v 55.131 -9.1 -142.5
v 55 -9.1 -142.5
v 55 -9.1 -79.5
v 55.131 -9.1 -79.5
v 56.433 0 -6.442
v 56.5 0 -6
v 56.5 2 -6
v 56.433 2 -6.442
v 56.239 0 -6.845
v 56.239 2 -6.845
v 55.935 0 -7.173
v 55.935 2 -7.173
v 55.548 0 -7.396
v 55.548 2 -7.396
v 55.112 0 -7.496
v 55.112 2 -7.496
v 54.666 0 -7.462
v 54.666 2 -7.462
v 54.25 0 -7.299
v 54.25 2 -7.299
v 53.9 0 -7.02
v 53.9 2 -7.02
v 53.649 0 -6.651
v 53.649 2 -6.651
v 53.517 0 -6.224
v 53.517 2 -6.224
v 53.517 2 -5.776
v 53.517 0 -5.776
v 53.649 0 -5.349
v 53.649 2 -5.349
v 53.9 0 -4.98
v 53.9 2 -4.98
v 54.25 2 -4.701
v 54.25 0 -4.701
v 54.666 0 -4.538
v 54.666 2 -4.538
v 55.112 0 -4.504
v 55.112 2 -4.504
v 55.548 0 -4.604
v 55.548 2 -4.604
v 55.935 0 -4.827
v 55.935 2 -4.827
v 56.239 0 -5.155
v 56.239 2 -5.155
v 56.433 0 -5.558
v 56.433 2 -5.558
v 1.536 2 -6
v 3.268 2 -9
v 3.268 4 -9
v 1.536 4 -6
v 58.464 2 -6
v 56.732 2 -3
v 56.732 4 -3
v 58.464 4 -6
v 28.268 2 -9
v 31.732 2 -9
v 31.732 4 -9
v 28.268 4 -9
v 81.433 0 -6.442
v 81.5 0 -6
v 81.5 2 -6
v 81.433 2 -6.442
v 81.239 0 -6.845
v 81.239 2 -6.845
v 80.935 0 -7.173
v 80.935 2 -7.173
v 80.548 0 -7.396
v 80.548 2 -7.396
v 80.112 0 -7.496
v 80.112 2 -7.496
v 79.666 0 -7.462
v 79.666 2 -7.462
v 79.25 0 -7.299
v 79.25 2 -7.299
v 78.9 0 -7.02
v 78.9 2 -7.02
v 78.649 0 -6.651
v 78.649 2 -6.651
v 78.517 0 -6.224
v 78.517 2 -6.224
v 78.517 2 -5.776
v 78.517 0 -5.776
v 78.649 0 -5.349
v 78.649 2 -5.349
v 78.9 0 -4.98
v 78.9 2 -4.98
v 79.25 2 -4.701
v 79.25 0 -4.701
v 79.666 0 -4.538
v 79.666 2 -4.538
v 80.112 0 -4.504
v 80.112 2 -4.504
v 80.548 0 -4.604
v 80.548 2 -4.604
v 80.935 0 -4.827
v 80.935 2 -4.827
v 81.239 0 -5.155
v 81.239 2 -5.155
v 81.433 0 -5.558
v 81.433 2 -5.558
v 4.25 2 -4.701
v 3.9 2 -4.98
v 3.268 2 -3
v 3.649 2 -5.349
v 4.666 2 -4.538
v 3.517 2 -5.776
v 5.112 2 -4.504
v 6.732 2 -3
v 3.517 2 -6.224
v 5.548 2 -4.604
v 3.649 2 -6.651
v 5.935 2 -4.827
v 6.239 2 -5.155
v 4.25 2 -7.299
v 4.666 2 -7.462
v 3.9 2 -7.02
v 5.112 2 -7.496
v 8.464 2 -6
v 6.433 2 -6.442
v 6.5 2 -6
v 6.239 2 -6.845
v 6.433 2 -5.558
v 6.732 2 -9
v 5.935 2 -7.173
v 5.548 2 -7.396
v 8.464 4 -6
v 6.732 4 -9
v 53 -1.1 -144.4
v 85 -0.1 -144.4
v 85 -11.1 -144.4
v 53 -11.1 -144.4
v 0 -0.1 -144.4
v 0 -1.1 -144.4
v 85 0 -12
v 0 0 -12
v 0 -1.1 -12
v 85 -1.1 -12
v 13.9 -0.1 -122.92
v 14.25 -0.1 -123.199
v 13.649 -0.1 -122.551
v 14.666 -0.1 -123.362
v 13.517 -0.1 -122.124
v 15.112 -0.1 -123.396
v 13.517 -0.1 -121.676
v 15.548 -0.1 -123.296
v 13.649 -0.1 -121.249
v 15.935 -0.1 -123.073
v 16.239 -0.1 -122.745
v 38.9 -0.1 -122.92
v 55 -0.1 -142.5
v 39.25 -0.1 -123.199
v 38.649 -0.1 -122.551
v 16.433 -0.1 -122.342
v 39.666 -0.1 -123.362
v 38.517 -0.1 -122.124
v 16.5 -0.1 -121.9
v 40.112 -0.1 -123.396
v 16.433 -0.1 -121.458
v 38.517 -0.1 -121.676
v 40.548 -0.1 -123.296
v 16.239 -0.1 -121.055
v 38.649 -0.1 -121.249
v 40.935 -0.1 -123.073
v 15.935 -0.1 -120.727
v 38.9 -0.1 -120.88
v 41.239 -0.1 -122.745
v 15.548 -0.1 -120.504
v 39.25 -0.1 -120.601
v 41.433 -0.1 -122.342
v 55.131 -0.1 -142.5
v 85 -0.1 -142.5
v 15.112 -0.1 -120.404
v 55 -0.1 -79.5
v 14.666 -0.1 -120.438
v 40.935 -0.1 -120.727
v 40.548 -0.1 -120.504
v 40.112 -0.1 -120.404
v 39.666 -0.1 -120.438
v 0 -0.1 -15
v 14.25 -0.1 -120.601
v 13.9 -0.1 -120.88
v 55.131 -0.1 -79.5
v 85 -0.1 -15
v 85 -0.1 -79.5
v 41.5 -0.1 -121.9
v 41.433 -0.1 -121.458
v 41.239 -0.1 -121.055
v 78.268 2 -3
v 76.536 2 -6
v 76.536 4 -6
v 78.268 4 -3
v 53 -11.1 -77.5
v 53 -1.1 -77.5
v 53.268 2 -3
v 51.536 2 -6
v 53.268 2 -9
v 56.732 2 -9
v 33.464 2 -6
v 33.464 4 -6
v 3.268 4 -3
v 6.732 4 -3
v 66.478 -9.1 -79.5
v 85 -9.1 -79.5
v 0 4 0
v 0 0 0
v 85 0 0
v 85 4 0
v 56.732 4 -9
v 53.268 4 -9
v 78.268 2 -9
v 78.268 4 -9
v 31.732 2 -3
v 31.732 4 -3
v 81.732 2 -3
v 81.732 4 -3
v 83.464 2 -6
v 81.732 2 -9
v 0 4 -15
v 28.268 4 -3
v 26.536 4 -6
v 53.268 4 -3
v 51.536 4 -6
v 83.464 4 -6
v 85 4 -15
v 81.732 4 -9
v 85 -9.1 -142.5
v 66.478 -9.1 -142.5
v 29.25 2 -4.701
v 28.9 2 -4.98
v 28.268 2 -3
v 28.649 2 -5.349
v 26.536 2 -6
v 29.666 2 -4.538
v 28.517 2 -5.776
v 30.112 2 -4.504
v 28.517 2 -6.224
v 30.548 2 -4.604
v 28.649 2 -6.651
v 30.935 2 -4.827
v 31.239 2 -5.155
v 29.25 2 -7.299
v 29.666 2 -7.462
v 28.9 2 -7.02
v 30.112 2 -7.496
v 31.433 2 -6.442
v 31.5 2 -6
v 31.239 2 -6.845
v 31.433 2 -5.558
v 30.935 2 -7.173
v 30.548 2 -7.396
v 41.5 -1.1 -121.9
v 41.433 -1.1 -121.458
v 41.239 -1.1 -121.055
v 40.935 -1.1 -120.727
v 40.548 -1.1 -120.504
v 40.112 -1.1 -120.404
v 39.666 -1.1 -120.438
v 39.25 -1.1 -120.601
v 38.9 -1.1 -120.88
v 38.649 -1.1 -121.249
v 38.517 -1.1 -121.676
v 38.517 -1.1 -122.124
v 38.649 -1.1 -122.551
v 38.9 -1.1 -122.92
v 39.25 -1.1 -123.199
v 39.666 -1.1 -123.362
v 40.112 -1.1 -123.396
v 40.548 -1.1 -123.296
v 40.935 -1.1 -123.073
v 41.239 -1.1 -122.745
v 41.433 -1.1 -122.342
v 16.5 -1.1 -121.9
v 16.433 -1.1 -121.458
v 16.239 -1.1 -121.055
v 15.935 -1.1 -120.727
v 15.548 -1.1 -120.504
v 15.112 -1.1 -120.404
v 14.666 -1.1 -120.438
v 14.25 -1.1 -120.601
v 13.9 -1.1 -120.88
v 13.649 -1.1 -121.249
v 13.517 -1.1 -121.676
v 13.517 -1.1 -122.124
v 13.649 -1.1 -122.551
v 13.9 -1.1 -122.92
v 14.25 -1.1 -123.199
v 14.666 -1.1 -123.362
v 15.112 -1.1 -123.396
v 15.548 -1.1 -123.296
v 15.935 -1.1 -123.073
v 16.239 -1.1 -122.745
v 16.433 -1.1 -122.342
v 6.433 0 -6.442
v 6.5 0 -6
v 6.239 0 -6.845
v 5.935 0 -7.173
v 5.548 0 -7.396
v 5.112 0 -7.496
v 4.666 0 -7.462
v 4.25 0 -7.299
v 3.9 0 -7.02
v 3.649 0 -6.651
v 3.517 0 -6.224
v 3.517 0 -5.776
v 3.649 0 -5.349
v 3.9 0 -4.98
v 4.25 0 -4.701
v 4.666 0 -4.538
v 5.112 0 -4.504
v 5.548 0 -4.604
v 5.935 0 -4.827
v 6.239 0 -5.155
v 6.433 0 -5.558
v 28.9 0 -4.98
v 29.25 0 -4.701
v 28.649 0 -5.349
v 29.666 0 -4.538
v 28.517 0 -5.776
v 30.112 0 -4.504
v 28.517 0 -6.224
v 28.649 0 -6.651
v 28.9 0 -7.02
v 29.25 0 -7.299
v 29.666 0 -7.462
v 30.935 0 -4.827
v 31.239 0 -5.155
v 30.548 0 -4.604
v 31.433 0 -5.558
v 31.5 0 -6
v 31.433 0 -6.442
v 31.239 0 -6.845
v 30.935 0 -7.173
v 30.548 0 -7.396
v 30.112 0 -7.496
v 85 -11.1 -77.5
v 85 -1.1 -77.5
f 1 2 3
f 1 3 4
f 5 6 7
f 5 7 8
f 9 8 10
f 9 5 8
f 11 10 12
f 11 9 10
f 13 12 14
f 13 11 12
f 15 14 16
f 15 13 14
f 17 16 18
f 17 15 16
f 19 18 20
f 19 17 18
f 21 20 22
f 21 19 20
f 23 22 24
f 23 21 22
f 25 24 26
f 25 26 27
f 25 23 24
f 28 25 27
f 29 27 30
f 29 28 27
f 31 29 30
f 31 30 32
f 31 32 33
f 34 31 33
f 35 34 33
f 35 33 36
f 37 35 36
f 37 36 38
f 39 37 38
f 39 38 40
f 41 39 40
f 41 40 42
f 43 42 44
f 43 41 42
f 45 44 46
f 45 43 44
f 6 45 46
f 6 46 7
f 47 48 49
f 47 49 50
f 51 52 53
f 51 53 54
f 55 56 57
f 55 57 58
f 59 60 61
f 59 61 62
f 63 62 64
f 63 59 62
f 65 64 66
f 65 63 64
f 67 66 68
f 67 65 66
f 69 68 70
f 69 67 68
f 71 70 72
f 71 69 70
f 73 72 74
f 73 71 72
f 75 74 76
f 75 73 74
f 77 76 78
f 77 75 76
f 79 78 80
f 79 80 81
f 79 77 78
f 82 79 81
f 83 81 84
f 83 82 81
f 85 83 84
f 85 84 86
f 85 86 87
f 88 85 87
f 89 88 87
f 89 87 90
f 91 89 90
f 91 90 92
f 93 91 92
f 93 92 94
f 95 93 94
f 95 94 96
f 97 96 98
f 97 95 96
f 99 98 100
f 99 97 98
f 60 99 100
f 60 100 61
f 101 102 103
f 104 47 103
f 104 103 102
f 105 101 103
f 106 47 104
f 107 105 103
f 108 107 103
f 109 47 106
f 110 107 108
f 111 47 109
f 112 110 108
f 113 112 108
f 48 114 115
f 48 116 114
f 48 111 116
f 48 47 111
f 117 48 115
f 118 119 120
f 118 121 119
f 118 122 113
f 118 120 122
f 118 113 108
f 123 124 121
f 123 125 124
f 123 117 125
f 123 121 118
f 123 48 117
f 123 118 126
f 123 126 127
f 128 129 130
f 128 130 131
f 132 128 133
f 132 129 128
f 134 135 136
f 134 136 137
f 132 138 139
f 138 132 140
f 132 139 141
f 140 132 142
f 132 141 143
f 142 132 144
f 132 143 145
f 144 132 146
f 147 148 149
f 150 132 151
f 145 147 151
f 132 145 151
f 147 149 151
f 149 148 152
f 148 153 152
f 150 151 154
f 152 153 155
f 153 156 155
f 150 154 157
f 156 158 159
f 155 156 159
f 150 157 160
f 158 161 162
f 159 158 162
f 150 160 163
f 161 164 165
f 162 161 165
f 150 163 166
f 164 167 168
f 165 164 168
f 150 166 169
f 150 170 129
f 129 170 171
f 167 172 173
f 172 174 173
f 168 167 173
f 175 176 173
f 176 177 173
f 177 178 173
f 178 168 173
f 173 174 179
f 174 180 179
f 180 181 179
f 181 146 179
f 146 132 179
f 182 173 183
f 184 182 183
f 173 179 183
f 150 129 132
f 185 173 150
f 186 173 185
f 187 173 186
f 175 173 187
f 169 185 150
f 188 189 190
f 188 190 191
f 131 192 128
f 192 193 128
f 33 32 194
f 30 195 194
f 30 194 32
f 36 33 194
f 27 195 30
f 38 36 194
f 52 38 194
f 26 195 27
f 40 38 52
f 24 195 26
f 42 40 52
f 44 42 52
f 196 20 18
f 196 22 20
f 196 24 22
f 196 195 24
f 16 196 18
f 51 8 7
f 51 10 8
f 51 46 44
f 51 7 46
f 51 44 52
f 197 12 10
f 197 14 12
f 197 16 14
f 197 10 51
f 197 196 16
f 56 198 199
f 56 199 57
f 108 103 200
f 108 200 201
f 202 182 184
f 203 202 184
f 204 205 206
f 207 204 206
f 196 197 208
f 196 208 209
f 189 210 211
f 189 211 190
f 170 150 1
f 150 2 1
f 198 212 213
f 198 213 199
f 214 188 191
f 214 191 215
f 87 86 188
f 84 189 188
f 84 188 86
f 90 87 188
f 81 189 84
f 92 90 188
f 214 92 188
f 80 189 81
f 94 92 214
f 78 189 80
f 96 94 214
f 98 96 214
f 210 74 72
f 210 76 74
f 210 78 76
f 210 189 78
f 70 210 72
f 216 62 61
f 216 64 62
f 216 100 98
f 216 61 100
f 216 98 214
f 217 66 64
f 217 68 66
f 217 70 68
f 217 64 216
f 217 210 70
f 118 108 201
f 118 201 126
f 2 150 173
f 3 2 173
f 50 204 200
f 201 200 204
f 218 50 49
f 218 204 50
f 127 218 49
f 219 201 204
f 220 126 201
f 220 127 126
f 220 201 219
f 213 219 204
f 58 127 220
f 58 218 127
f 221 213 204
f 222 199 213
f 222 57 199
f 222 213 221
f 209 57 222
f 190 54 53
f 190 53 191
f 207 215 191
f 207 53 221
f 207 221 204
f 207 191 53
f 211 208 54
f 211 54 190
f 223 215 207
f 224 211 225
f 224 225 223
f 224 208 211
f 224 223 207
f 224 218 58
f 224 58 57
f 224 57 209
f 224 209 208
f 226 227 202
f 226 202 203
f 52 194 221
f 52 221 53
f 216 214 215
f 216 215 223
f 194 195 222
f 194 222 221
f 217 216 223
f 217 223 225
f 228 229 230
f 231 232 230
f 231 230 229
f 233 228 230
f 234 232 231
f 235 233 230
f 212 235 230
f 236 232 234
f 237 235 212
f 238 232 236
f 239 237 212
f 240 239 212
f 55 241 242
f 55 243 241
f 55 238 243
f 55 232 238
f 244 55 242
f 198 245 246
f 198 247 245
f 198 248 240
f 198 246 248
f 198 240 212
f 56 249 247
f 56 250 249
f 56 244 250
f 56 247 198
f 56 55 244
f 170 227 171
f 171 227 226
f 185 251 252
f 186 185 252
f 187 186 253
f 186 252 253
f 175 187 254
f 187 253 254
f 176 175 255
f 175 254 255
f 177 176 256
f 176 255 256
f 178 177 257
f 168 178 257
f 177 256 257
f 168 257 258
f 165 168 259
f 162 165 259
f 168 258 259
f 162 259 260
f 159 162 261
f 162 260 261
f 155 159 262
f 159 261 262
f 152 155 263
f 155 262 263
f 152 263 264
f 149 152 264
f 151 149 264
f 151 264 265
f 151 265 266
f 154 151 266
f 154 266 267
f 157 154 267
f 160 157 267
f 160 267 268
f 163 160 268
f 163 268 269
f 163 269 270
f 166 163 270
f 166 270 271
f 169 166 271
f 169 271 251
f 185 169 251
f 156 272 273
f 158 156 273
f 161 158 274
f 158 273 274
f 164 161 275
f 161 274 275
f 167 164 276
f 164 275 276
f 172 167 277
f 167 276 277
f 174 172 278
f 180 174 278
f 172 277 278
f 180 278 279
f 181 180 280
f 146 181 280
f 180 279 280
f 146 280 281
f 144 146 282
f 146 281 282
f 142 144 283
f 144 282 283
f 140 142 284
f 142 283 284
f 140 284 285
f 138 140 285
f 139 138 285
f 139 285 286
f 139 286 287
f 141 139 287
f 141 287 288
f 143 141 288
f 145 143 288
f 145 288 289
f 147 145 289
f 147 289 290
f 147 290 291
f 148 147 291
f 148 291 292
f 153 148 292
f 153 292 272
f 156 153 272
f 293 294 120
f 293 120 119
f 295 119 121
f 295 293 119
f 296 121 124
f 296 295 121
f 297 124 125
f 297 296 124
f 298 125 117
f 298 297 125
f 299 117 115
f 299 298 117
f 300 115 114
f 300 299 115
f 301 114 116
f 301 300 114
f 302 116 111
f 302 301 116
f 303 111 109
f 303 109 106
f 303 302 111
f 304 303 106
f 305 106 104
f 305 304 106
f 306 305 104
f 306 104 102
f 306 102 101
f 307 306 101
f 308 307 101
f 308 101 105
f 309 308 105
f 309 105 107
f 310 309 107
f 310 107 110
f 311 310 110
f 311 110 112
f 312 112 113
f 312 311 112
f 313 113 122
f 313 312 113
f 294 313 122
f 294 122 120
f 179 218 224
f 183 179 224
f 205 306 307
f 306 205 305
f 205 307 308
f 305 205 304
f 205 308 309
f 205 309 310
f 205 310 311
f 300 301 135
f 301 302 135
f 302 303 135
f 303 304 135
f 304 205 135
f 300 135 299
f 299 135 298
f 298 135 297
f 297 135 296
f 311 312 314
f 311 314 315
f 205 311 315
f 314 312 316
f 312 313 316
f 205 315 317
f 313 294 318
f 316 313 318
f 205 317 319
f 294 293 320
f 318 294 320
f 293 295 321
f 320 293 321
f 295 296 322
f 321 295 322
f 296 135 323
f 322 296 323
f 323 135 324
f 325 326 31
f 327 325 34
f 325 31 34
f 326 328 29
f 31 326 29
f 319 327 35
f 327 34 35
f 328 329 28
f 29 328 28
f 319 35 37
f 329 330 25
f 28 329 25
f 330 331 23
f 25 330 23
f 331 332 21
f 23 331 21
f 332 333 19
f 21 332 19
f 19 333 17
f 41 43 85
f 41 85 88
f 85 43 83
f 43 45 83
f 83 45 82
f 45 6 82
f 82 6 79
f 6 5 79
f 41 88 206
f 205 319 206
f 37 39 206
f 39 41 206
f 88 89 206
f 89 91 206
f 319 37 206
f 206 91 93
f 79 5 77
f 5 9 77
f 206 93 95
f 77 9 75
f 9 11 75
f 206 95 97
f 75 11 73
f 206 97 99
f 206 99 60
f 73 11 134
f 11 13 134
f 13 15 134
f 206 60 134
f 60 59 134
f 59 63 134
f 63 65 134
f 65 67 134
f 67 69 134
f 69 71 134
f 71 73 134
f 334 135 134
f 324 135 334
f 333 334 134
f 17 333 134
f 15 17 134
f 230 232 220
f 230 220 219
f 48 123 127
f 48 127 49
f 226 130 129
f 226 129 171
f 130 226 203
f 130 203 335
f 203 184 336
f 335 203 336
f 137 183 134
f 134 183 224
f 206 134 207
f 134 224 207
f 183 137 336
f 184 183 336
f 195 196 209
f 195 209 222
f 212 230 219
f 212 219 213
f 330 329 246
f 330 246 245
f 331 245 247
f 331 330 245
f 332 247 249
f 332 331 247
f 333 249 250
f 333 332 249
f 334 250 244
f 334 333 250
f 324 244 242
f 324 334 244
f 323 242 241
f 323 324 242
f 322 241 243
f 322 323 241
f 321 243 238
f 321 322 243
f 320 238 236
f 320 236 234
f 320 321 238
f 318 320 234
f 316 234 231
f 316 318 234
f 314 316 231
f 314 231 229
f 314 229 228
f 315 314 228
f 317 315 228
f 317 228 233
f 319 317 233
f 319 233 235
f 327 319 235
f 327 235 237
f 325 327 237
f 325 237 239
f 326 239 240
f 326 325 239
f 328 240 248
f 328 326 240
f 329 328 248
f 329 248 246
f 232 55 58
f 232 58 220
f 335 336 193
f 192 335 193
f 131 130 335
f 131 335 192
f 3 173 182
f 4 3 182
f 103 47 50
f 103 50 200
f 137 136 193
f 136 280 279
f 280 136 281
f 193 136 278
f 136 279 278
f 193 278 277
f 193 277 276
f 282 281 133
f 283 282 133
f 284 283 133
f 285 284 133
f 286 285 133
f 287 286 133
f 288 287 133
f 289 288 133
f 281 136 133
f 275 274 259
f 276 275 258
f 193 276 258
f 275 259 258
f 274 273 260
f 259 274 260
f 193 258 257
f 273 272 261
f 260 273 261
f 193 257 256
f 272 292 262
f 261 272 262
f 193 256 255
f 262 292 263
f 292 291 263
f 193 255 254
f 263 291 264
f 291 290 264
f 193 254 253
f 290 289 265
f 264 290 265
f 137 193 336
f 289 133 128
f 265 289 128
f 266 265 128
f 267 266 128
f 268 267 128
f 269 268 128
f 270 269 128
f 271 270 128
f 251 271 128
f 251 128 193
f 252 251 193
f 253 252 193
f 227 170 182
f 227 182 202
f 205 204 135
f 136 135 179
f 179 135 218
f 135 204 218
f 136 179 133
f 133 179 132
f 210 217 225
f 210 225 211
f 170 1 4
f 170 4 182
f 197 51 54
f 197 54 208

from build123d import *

# Parameters (mm, degrees)
SKETCH1_W           = 85
SKETCH1_H           = 12
SKETCH1_R           = 1.5
BOSS_EXTRUDE1_DEPTH = 2
SKETCH1_3_W         = 85
SKETCH1_3_H         = 12
BOSS_EXTRUDE2_DEPTH = 4
SKETCH2_W           = 85
SKETCH2_H           = 3
BOSS_EXTRUDE3_DEPTH = 5.1
BOSS_EXTRUDE4_DEPTH = 1
BOSS_EXTRUDE5_DEPTH = 10
SKETCH5_W           = 32
SKETCH5_H           = 67
BOSS_EXTRUDE6_DEPTH = 2
SKETCH6_W           = 32
SKETCH6_H           = 2
BOSS_EXTRUDE7_DEPTH = 11
BOSS_EXTRUDE9_DEPTH = 65
SKETCH9_W           = 100.016978449
SKETCH9_H           = 38.136204689
CUT_EXTRUDE1_DEPTH  = 0.1
SKETCH10_R          = 1.5
CUT_EXTRUDE2_DEPTH  = 6.1


with BuildPart() as part:
    # Sketch1 → Boss-Extrude1 (new body)
    with BuildSketch(Plane(origin=(0, 0, 0), x_dir=(1, 0, 0), z_dir=(0, 1, 0))):
        with Locations((42.5, 6)):
            Rectangle(SKETCH1_W, SKETCH1_H)
        Polygon((81.732050808, 3), (83.464101615, 6), (81.732050808, 9), (78.267949192, 9), (76.535898385, 6), (78.267949192, 3), align=None, mode=Mode.SUBTRACT)
        Polygon((56.732050808, 3), (58.464101615, 6), (56.732050808, 9), (53.267949192, 9), (51.535898385, 6), (53.267949192, 3), align=None, mode=Mode.SUBTRACT)
        Polygon((31.732050808, 3), (33.464101615, 6), (31.732050808, 9), (28.267949192, 9), (26.535898385, 6), (28.267949192, 3), align=None, mode=Mode.SUBTRACT)
        Polygon((6.732050808, 3), (8.464101615, 6), (6.732050808, 9), (3.267949192, 9), (1.535898385, 6), (3.267949192, 3), align=None, mode=Mode.SUBTRACT)
        Polygon((3.267949192, 3), (6.732050808, 3), (8.464101615, 6), (6.732050808, 9), (3.267949192, 9), (1.535898385, 6), align=None)
        with Locations((5, 6)):
            Circle(SKETCH1_R, mode=Mode.SUBTRACT)
        Polygon((28.267949192, 3), (31.732050808, 3), (33.464101615, 6), (31.732050808, 9), (28.267949192, 9), (26.535898385, 6), align=None)
        with Locations((30, 6)):
            Circle(SKETCH1_R, mode=Mode.SUBTRACT)
        Polygon((53.267949192, 3), (56.732050808, 3), (58.464101615, 6), (56.732050808, 9), (53.267949192, 9), (51.535898385, 6), align=None)
        with Locations((55, 6)):
            Circle(SKETCH1_R, mode=Mode.SUBTRACT)
        Polygon((78.267949192, 3), (81.732050808, 3), (83.464101615, 6), (81.732050808, 9), (78.267949192, 9), (76.535898385, 6), align=None)
        with Locations((80, 6)):
            Circle(SKETCH1_R, mode=Mode.SUBTRACT)
    extrude(amount=BOSS_EXTRUDE1_DEPTH)

    # Sketch1<3> → Boss-Extrude2 (add)
    with BuildSketch(Plane(origin=(0, 0, 0), x_dir=(1, 0, 0), z_dir=(0, 1, 0))):
        with Locations((42.5, 6)):
            Rectangle(SKETCH1_3_W, SKETCH1_3_H)
        Polygon((81.732050808, 3), (83.464101615, 6), (81.732050808, 9), (78.267949192, 9), (76.535898385, 6), (78.267949192, 3), align=None, mode=Mode.SUBTRACT)
        Polygon((56.732050808, 3), (58.464101615, 6), (56.732050808, 9), (53.267949192, 9), (51.535898385, 6), (53.267949192, 3), align=None, mode=Mode.SUBTRACT)
        Polygon((31.732050808, 3), (33.464101615, 6), (31.732050808, 9), (28.267949192, 9), (26.535898385, 6), (28.267949192, 3), align=None, mode=Mode.SUBTRACT)
        Polygon((6.732050808, 3), (8.464101615, 6), (6.732050808, 9), (3.267949192, 9), (1.535898385, 6), (3.267949192, 3), align=None, mode=Mode.SUBTRACT)
    extrude(amount=BOSS_EXTRUDE2_DEPTH)

    # Sketch2 → Boss-Extrude3 (add)
    with BuildSketch(Plane(origin=(0, 4, 0), x_dir=(1, 0, 0), z_dir=(0, 1, 0))):
        with Locations((42.5, 13.5)):
            Rectangle(SKETCH2_W, SKETCH2_H)
    extrude(amount=-BOSS_EXTRUDE3_DEPTH)

    # Sketch3 → Boss-Extrude4 (add)
    with BuildSketch(Plane.XZ.offset(1.1)):
        Polygon((85, -12), (0, -12), (0, -144.5), (55, -144.5), (55, -79.5), (85, -79.5), align=None)
    extrude(amount=-BOSS_EXTRUDE4_DEPTH)

    # Sketch4 → Boss-Extrude5 (add)
    with BuildSketch(Plane.XZ.offset(1.1)):
        Polygon((85, -79.5), (85, -77.5), (53, -77.5), (53, -144.5), (55, -144.5), (55, -79.5), align=None)
    extrude(amount=BOSS_EXTRUDE5_DEPTH)

    # Sketch5 → Boss-Extrude6 (add)
    with BuildSketch(Plane.XZ.offset(11.1)):
        with Locations((69, -111)):
            Rectangle(SKETCH5_W, SKETCH5_H)
    extrude(amount=-BOSS_EXTRUDE6_DEPTH)

    # Sketch6 → Boss-Extrude7 (add)
    with BuildSketch(Plane.XZ.offset(11.1)):
        with Locations((69, -143.5)):
            Rectangle(SKETCH6_W, SKETCH6_H)
    extrude(amount=-BOSS_EXTRUDE7_DEPTH)

    # Sketch8 → Boss-Extrude9 (add)
    with BuildSketch(Plane(origin=(0, 0, -144.5), x_dir=(-1, 0, 0), z_dir=(0, 0, -1))):
        Polygon((-55.130583843, -11.1), (-55.130583843, -0.1), (-69, -11.1), align=None)
    extrude(amount=-BOSS_EXTRUDE9_DEPTH)

    # Sketch9 → Cut-Extrude1 (cut)
    with BuildSketch(Plane(origin=(0, 0, -144.5), x_dir=(-1, 0, 0), z_dir=(0, 0, -1))):
        with Locations((-50.008489225, -19.168102345)):
            Rectangle(SKETCH9_W, SKETCH9_H)
    extrude(amount=-CUT_EXTRUDE1_DEPTH, mode=Mode.SUBTRACT)

    # Sketch10 → Cut-Extrude2 (cut, through all)
    with BuildSketch(Plane.XZ.offset(1.1)):
        with Locations((15, -121.9)):
            Circle(SKETCH10_R)
        with Locations((40, -121.9)):
            Circle(SKETCH10_R)
    extrude(amount=-CUT_EXTRUDE2_DEPTH, mode=Mode.SUBTRACT)


solid = part.part
